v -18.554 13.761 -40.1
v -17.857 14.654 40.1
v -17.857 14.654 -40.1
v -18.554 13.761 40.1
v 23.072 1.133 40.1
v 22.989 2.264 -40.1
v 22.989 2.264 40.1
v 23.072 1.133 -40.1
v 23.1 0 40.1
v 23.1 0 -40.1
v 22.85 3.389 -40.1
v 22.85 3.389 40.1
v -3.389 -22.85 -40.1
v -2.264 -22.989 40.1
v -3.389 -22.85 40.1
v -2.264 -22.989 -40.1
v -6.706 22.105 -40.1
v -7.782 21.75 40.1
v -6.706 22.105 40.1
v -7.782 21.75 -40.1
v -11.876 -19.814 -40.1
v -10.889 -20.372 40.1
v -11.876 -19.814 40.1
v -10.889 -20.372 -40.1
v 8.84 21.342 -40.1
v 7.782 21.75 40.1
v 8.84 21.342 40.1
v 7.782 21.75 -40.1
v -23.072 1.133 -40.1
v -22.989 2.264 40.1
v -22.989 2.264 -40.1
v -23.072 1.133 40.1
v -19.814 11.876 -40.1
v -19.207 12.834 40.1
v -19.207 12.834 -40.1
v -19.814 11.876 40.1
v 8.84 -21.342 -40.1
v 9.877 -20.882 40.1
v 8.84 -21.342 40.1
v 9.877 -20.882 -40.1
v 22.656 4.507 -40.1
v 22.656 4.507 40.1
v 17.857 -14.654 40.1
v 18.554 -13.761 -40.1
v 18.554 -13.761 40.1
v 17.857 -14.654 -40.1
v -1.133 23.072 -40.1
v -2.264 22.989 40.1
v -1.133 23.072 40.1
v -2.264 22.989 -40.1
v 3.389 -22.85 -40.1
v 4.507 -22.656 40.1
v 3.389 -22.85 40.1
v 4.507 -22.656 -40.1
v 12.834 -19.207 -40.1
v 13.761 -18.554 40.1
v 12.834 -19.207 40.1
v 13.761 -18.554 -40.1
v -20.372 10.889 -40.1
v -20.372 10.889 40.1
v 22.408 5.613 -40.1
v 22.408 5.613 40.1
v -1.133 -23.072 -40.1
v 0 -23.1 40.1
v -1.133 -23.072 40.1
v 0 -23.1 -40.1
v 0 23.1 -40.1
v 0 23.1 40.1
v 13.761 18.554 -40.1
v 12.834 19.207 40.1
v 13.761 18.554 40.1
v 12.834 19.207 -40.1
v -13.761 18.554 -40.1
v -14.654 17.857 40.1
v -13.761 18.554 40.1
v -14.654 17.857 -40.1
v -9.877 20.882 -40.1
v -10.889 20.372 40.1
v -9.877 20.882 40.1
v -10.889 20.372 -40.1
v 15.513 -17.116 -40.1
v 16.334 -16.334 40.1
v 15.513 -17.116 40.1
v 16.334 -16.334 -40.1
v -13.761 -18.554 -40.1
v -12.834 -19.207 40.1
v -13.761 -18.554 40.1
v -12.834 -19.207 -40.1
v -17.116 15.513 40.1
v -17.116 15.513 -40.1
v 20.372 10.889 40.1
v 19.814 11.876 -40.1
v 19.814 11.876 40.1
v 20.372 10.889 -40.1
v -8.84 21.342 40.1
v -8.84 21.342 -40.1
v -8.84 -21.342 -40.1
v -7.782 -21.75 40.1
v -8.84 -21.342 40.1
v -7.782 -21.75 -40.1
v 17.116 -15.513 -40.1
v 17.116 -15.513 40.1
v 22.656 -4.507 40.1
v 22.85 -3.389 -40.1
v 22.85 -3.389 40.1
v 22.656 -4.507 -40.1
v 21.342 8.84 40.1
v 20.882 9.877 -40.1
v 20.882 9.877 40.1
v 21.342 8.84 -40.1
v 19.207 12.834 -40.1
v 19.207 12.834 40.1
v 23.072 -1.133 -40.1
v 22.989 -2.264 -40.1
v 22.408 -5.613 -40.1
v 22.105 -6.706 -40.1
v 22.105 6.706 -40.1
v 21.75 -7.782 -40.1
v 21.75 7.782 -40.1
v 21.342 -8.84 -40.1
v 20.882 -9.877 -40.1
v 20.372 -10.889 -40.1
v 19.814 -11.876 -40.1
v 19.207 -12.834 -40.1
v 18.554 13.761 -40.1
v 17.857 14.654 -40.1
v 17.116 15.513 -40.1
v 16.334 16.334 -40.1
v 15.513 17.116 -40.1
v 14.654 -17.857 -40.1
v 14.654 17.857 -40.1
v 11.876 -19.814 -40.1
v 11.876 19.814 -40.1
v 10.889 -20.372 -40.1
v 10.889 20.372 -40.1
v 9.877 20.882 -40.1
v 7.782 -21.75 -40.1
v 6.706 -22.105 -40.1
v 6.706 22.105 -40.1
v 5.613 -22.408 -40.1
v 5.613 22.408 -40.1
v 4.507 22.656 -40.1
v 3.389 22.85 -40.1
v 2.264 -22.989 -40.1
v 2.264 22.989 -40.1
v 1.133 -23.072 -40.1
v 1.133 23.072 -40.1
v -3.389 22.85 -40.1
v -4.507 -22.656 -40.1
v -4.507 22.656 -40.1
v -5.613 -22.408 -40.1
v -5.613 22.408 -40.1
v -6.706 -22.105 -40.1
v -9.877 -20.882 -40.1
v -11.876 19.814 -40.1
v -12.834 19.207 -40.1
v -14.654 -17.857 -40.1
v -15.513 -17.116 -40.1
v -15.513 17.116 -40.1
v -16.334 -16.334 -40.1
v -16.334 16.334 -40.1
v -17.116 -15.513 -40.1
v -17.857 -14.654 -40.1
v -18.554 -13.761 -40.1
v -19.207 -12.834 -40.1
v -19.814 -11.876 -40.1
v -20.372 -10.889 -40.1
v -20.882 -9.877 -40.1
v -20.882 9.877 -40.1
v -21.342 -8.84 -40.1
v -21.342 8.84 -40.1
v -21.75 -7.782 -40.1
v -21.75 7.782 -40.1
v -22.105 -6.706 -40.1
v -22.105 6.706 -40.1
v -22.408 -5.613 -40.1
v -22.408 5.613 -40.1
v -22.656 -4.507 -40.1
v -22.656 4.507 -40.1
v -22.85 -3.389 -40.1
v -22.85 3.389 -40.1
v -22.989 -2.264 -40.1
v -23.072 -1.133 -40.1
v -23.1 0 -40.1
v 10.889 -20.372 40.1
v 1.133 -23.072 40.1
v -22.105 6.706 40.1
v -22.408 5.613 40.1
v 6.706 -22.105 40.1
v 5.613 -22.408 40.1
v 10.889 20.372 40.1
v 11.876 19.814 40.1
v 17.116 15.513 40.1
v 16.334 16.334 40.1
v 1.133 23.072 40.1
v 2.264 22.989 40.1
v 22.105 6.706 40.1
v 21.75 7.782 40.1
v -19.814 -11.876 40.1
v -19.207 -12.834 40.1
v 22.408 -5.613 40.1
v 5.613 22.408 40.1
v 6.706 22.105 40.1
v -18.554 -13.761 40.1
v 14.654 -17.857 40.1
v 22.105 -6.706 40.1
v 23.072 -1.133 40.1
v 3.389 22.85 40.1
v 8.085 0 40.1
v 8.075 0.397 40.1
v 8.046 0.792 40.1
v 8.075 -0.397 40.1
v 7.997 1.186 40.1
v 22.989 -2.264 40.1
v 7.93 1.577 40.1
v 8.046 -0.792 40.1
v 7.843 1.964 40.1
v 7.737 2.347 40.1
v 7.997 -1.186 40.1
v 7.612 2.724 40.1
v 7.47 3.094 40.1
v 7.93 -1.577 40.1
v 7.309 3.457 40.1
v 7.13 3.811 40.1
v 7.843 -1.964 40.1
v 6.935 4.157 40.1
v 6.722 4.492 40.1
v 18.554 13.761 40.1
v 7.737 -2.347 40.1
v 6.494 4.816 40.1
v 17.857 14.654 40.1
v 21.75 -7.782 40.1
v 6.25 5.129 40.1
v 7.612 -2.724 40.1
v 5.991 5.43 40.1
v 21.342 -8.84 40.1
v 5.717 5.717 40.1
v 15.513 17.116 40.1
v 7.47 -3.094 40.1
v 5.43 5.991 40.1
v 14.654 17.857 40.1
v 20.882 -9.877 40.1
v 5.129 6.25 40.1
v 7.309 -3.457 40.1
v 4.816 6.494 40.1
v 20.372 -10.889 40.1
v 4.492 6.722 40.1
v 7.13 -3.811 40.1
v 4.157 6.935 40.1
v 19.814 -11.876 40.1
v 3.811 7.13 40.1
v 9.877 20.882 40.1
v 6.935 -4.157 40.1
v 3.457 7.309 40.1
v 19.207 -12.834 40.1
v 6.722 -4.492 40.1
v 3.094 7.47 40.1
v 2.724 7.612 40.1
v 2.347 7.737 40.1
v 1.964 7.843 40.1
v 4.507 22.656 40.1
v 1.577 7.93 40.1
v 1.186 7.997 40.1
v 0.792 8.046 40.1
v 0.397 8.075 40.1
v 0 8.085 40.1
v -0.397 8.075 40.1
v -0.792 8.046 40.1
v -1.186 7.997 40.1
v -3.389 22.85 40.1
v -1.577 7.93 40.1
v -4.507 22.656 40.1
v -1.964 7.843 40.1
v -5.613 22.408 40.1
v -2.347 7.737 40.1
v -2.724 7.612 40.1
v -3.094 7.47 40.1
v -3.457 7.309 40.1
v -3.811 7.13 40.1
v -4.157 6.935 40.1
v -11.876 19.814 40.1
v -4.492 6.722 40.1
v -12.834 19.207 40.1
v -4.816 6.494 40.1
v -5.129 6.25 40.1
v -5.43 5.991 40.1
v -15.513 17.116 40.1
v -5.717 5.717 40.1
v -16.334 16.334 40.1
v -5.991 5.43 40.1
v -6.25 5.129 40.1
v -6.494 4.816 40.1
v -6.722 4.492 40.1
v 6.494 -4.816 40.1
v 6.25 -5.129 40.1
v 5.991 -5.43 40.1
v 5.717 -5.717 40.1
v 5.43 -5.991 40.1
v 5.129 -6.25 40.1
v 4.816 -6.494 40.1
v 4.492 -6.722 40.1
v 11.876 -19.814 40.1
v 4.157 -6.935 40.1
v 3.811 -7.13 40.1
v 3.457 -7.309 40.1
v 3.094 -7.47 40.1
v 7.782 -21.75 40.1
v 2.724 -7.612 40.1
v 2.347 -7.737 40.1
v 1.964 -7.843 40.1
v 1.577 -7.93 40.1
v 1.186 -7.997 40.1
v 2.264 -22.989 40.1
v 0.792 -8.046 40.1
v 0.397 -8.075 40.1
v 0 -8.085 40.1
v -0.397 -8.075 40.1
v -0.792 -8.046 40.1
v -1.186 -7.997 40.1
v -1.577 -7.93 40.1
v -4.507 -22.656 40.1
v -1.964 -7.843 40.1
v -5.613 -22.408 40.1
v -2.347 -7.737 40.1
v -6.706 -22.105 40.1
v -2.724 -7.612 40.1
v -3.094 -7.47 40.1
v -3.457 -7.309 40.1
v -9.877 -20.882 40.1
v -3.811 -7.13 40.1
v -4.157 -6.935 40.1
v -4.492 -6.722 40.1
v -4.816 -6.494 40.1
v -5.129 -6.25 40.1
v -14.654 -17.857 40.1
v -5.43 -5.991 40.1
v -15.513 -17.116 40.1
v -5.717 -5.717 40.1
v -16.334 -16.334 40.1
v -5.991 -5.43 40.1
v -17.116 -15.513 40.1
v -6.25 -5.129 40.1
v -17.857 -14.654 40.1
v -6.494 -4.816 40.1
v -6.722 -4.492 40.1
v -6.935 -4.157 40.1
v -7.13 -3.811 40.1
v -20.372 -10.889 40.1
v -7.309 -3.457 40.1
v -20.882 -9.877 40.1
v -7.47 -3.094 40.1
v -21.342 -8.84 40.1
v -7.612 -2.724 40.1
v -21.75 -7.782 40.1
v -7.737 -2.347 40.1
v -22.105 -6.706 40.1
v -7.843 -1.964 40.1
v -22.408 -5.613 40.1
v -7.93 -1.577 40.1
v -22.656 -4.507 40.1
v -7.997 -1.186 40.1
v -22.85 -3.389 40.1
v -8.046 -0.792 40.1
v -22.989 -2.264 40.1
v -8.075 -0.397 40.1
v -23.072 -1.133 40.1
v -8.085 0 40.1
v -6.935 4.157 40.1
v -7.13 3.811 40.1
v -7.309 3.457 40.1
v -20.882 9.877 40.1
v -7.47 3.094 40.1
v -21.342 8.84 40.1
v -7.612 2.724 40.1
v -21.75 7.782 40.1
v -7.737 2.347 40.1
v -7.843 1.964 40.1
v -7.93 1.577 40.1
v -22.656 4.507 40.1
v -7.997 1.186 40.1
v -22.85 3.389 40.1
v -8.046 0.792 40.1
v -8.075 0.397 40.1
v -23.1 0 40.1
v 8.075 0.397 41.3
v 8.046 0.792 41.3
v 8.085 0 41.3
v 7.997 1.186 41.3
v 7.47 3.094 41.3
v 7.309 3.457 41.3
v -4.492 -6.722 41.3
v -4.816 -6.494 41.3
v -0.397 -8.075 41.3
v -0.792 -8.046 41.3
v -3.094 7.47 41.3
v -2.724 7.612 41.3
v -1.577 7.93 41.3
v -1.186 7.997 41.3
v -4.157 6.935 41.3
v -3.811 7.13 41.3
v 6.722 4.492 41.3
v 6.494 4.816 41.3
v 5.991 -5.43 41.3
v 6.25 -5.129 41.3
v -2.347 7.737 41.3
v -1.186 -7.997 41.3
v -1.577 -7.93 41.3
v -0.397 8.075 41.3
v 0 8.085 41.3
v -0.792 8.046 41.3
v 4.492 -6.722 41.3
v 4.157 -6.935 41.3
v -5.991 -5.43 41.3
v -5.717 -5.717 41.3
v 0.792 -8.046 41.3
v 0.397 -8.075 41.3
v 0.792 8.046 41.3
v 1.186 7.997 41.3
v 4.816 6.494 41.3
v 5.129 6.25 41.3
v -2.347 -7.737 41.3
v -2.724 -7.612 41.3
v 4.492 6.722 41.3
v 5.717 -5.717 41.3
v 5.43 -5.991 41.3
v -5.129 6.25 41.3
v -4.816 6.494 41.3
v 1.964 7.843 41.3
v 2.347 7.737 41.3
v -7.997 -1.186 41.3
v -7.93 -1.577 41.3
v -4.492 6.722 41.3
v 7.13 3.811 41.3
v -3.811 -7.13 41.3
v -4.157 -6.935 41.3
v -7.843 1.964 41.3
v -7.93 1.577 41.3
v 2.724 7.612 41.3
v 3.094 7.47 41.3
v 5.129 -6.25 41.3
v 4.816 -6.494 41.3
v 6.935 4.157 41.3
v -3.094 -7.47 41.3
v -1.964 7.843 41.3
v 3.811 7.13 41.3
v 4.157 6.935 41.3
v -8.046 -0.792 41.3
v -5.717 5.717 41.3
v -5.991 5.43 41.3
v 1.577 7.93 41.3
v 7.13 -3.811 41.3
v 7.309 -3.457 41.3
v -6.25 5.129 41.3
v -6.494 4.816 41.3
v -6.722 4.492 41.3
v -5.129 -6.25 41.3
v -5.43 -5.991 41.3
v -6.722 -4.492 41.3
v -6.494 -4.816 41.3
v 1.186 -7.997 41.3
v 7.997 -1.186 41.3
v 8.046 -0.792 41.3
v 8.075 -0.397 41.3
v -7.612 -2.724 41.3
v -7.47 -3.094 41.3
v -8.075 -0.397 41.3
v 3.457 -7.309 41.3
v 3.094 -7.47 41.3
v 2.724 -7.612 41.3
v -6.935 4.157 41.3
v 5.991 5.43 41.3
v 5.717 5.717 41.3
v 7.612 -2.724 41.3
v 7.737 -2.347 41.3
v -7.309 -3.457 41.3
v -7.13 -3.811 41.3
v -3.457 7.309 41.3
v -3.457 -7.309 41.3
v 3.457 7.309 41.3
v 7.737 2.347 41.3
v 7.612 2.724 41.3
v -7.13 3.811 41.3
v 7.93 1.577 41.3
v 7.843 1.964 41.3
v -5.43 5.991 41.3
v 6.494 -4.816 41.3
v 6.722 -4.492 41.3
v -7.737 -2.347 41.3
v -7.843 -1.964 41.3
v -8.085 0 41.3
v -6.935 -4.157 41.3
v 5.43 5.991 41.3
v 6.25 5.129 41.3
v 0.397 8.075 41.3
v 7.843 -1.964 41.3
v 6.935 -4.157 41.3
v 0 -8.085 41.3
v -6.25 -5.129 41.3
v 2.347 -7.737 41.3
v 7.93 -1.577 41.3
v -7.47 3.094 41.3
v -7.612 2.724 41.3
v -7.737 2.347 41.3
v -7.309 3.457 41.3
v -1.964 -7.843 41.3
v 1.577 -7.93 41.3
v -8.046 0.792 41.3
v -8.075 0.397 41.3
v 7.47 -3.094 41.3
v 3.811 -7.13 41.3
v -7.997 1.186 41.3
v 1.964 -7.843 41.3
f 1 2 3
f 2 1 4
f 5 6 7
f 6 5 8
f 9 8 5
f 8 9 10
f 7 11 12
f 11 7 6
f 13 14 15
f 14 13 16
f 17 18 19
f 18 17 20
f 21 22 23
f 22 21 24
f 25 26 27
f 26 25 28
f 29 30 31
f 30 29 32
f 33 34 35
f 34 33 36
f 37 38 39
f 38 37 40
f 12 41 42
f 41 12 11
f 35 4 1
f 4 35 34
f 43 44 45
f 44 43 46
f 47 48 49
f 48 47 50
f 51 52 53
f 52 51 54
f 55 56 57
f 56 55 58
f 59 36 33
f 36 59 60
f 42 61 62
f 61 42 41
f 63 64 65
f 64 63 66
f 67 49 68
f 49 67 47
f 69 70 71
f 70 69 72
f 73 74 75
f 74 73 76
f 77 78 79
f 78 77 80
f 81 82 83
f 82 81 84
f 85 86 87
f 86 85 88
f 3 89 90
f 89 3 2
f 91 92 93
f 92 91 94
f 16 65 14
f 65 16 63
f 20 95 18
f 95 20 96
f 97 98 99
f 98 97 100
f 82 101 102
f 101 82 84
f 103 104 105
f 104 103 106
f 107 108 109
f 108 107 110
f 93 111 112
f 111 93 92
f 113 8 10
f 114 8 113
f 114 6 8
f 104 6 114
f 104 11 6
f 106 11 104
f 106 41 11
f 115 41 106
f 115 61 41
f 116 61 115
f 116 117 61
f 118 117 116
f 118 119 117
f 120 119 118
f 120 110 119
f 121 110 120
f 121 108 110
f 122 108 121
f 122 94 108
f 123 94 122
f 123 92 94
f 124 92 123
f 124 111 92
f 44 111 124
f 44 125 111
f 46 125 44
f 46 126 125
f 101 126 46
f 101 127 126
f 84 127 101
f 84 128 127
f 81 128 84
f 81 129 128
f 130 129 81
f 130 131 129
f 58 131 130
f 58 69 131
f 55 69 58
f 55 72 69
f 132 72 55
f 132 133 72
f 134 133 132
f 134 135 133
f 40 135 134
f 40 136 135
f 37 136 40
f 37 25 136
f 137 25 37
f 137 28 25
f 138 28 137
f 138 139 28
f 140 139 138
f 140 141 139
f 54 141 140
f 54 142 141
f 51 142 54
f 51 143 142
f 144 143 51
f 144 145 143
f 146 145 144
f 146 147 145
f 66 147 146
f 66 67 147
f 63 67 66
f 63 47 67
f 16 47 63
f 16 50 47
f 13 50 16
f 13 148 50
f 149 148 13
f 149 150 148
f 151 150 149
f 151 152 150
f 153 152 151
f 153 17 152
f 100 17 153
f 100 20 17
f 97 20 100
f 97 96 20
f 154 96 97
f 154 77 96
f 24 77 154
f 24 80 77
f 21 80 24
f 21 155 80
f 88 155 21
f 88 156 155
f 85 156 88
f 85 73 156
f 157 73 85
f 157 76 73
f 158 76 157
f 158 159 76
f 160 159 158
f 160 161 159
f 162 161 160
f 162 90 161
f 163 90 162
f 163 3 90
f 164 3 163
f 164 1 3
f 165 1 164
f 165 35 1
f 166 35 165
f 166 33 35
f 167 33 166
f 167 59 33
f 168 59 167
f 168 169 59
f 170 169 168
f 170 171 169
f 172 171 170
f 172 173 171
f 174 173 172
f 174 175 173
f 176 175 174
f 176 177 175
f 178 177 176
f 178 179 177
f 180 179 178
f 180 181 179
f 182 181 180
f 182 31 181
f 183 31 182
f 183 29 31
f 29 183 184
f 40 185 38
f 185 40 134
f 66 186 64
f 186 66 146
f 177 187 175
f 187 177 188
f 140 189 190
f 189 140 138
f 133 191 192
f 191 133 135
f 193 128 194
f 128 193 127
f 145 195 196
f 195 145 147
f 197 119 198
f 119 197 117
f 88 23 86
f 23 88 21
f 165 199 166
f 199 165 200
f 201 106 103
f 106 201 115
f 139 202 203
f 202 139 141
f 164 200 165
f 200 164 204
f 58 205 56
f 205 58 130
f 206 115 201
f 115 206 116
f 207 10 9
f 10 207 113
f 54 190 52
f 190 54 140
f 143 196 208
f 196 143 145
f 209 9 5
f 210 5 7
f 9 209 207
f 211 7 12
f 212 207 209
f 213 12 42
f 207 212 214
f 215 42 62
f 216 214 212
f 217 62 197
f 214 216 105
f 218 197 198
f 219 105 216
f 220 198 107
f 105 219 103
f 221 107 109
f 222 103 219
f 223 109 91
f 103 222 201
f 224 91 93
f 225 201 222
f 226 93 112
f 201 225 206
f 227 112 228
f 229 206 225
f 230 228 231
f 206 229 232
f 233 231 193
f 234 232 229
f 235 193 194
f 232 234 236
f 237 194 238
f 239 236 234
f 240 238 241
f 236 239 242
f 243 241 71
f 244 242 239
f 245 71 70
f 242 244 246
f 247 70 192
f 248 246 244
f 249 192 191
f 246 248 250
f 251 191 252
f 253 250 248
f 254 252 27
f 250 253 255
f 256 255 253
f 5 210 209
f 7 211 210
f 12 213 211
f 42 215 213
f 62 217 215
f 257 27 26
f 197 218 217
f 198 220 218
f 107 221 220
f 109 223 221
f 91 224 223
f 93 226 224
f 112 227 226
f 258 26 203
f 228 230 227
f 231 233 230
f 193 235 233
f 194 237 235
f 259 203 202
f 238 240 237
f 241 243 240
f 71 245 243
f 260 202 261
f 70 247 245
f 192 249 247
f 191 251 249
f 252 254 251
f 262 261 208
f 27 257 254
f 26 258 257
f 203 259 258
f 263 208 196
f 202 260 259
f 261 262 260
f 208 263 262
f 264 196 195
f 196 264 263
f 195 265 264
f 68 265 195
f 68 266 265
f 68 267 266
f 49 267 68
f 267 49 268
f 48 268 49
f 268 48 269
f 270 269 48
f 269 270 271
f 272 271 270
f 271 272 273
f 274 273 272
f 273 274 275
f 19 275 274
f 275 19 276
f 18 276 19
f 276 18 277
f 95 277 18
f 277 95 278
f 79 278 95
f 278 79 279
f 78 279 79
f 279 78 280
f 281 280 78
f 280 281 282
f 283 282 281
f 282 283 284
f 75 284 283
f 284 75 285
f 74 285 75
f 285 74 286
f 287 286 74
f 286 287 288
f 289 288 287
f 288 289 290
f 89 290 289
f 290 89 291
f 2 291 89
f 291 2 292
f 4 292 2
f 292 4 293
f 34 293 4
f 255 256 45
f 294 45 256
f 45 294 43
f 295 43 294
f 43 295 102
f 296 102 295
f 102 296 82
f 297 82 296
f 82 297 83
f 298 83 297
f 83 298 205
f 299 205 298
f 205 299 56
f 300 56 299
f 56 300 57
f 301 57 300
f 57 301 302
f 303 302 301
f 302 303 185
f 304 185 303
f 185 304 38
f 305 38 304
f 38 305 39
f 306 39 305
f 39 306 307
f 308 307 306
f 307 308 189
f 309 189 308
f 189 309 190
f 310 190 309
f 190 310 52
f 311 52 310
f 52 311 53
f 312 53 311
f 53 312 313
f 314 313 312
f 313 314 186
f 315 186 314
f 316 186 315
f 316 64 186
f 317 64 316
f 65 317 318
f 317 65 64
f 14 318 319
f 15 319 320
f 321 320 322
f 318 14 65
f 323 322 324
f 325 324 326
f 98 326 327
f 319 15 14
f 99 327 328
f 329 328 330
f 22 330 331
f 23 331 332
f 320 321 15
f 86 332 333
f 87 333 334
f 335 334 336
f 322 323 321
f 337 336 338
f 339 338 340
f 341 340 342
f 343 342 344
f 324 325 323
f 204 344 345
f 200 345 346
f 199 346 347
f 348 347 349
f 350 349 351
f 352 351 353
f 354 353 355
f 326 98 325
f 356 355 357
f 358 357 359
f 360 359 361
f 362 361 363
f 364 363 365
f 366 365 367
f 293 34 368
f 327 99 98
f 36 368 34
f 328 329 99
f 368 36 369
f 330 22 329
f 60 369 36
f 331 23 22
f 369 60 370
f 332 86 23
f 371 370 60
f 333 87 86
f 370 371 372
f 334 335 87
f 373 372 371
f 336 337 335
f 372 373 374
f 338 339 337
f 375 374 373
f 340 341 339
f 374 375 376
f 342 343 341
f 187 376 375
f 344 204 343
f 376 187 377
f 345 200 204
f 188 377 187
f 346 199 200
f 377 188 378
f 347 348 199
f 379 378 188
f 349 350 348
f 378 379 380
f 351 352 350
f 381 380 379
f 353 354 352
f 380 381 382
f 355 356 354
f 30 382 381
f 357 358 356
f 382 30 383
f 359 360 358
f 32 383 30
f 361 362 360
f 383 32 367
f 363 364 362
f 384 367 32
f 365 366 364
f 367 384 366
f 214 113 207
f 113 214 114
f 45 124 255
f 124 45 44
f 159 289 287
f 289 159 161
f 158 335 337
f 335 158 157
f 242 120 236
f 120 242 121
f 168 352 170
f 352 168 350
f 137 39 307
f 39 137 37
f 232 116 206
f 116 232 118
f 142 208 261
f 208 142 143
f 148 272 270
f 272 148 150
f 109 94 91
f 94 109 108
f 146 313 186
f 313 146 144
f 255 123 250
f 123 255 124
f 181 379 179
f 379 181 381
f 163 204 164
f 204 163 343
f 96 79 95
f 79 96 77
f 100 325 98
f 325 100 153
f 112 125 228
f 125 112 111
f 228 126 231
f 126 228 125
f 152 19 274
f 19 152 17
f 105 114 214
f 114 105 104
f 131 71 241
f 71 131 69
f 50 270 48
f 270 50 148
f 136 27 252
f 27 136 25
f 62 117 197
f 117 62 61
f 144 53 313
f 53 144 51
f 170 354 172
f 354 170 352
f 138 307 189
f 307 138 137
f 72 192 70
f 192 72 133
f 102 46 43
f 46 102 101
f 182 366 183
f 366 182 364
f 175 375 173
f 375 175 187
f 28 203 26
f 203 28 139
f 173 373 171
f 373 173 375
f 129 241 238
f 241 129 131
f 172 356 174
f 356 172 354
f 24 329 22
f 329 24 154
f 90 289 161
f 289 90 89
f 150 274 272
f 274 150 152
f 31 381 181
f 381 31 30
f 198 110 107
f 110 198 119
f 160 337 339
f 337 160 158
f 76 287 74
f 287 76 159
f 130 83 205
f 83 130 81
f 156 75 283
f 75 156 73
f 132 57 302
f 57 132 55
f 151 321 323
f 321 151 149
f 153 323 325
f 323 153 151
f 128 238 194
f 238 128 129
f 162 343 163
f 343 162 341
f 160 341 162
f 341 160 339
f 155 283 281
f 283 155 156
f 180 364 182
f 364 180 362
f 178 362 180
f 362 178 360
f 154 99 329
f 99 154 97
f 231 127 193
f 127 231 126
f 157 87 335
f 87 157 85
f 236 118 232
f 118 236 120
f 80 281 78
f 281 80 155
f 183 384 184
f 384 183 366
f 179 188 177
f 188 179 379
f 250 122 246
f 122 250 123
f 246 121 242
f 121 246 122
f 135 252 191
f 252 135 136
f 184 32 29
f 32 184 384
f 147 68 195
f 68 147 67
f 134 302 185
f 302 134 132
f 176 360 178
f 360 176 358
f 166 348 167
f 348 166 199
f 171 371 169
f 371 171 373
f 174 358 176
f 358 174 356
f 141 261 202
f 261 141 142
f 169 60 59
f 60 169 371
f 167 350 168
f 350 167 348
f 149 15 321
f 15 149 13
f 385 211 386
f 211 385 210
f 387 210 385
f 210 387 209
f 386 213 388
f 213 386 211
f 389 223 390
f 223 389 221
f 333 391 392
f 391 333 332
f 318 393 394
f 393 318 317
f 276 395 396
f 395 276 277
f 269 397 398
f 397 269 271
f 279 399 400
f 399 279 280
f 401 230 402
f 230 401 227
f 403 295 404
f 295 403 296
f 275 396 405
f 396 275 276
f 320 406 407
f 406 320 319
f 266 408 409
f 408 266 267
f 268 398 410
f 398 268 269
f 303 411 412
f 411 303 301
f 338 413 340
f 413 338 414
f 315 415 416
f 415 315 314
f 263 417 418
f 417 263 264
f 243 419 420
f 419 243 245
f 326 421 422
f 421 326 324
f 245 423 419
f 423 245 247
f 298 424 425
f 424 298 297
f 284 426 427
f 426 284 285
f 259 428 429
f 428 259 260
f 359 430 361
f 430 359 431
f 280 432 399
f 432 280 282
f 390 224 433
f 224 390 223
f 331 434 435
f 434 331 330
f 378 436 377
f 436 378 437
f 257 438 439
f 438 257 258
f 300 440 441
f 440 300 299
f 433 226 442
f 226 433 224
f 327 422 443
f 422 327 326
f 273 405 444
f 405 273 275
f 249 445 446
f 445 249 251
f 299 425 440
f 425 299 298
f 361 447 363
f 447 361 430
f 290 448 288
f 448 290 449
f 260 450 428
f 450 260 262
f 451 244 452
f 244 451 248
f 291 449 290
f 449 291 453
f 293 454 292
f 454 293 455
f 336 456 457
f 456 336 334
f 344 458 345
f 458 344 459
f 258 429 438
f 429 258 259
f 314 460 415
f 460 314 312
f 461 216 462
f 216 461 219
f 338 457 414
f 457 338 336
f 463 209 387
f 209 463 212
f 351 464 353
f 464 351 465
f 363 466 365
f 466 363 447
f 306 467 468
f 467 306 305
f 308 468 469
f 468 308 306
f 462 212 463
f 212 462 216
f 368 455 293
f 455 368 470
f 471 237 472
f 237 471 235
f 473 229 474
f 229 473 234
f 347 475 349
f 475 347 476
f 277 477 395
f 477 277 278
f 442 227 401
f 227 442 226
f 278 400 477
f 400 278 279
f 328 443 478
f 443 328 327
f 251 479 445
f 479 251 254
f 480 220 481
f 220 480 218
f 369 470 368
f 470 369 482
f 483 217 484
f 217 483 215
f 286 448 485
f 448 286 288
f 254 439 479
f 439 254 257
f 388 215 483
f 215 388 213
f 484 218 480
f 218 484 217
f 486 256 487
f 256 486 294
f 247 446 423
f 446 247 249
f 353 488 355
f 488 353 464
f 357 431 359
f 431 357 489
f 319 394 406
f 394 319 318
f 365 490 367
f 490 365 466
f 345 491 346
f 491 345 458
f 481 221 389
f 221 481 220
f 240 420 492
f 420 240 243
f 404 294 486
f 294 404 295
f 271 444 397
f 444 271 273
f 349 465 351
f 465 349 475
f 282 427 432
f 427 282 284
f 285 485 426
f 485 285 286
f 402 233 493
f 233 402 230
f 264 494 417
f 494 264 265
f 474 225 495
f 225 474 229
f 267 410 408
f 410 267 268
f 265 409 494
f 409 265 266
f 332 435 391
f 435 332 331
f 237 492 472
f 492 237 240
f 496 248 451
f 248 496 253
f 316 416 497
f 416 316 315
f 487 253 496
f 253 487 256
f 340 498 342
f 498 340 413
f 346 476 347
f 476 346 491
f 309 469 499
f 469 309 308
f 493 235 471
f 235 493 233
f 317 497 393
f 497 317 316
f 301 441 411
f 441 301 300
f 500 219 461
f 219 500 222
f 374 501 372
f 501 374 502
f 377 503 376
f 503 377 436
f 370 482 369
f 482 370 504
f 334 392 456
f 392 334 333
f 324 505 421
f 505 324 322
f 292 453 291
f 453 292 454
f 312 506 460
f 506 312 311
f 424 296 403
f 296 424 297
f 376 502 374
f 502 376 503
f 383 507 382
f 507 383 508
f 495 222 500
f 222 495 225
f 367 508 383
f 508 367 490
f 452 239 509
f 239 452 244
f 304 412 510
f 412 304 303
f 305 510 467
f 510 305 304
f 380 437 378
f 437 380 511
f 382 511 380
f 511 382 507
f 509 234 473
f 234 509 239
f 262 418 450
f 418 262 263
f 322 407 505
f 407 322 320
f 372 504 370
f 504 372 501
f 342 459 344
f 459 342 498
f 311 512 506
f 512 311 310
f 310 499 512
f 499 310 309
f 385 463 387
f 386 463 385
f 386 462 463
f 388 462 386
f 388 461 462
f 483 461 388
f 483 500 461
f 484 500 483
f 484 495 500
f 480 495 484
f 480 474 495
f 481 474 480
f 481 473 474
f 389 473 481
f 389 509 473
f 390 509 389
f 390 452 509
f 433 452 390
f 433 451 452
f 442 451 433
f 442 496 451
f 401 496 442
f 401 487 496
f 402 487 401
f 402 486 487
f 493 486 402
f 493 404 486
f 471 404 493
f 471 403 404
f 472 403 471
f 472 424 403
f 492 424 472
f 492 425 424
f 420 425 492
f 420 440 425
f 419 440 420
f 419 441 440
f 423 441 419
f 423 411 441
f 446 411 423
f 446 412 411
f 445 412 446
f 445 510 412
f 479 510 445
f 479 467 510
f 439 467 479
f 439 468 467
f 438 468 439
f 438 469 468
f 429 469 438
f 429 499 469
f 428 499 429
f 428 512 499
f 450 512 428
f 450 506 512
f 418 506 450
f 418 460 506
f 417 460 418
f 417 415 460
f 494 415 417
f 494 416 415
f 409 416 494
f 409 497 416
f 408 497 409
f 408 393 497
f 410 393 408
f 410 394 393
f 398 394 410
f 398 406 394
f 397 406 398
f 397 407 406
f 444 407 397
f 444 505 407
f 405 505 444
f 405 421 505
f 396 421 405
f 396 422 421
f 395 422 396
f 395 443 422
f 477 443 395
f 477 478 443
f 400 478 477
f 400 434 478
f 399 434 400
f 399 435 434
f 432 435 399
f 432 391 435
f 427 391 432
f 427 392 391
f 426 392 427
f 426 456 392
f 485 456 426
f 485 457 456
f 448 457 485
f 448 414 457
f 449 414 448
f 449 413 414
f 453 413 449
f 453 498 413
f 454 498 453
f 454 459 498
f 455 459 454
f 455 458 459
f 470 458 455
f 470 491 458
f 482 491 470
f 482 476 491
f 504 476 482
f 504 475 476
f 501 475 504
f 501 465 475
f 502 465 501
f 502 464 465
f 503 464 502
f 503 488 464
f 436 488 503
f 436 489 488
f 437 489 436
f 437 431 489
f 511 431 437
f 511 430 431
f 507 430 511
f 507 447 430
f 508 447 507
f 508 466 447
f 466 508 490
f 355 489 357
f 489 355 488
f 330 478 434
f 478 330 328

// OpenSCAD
$fn=128;

cell_h = 80.2;
cell_d = 46.2;

cap_h = 2.0;
cap_d = cell_d * 0.92;

button_h = 1.2;
button_d = cell_d * 0.35;

module battery_cell(h=cell_h, d=cell_d) {
    union() {
        cylinder(h=h, d=d, center=true);
        translate([0,0,(h/2)-(cap_h/2)])
            cylinder(h=cap_h, d=cap_d, center=true);
        translate([0,0,(h/2)+(button_h/2)])
            cylinder(h=button_h, d=button_d, center=true);
    }
}

battery_cell();
